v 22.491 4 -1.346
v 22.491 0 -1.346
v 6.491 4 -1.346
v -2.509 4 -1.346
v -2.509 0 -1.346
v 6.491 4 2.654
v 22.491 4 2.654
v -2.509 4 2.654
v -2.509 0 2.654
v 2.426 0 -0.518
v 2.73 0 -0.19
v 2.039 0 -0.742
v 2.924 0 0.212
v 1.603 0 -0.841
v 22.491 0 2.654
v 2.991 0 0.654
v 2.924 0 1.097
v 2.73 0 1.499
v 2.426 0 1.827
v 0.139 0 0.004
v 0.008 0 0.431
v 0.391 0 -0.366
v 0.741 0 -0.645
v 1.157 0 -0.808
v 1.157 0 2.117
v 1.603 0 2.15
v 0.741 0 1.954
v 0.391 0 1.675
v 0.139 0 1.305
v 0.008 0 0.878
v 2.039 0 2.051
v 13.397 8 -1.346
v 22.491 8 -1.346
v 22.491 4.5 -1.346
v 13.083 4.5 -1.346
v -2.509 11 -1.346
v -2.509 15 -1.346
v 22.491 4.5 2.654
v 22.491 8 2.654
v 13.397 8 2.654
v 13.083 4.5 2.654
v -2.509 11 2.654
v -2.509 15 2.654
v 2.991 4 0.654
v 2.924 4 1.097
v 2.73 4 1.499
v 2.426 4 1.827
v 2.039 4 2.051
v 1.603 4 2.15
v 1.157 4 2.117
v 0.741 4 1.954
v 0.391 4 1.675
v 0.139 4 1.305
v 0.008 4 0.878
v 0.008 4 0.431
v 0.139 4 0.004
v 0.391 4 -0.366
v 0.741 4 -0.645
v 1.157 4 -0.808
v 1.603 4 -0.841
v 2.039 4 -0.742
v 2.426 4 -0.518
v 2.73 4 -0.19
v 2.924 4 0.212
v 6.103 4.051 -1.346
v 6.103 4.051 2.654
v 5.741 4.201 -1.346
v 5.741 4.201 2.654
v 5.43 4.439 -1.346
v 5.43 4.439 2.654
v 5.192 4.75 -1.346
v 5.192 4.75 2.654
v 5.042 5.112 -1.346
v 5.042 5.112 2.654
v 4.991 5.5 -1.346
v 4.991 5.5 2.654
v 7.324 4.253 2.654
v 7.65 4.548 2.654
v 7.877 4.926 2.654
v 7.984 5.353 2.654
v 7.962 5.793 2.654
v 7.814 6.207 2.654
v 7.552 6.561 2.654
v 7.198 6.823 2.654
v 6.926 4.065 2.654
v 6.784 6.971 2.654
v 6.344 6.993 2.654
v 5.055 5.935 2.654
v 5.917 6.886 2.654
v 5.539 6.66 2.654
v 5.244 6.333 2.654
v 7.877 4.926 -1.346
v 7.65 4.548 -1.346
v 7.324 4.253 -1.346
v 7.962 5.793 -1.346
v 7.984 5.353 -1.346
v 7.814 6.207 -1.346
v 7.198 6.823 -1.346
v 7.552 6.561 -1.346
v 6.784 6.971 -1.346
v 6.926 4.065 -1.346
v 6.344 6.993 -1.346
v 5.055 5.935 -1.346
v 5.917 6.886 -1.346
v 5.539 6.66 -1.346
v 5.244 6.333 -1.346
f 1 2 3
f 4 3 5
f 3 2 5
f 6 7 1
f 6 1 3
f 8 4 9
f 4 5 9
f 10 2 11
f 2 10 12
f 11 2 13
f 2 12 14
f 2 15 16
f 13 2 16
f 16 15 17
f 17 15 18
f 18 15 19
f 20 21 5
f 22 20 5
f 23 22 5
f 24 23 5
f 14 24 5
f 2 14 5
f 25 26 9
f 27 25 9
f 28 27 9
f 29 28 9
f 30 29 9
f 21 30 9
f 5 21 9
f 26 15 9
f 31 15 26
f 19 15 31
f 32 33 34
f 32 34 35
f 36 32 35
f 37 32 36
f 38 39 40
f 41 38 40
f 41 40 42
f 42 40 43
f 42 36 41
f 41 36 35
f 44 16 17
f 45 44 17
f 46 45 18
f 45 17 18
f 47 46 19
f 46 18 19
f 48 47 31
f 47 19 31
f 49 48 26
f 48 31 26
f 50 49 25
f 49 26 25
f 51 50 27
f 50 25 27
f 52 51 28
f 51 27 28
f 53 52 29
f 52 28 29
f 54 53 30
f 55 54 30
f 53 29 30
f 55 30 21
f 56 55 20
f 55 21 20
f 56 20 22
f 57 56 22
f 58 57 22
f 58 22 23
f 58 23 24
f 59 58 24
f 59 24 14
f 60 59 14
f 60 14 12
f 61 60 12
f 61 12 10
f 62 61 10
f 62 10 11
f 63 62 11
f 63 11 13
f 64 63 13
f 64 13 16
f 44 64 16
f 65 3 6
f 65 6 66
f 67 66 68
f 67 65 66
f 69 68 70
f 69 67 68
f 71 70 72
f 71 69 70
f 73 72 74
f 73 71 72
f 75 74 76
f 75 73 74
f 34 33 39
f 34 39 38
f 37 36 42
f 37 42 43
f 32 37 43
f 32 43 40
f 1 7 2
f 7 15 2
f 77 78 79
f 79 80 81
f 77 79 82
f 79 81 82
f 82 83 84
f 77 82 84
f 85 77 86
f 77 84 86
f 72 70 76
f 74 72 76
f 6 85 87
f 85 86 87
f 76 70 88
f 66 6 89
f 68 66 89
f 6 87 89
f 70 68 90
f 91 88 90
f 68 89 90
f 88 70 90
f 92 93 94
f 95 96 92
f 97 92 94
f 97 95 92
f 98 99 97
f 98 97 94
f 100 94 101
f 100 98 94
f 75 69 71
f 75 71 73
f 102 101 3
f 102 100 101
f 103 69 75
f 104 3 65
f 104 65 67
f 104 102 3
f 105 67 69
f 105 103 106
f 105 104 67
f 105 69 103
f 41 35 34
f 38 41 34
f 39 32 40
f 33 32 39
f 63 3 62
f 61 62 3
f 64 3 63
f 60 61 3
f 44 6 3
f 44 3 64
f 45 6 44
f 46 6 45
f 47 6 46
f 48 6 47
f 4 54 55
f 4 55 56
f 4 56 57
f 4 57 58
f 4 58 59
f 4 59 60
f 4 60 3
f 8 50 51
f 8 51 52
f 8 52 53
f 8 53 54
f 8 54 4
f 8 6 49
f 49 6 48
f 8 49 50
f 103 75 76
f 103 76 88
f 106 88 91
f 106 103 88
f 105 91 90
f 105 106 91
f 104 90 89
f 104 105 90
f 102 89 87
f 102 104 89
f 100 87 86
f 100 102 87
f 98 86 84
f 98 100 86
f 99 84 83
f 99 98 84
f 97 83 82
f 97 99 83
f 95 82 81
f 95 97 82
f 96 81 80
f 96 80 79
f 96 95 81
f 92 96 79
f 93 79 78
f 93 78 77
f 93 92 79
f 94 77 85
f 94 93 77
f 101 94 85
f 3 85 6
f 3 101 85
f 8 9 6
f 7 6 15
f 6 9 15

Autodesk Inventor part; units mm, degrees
ref_plane "YZ Plane" through (0, 0, 0) normal (1, 0, 0) x (0, 1, 0)
ref_plane "XZ Plane" through (0, 0, 0) normal (0, 1, 0) x (-1, 0, 0)
ref_plane "XY Plane" through (0, 0, 0) normal (0, 0, 1) x (1, 0, 0)
sketch "Esquisse1" plane through (0, 0, 0) normal (0, 1, 0) x (-1, 0, 0)
  line L0 (2.5091, 2.6545) -> (-22.4909, 2.6545)
  line L1 (-22.4909, 2.6545) -> (-22.4909, -1.3455)
  line L2 (-22.4909, -1.3455) -> (2.5091, -1.3455)
  line L3 (2.5091, -1.3455) -> (2.5091, 2.6545)
  point P0 (0, 0)
  dimension "d0" = 4
  dimension "d1" = 25
extrude "Extrusion1" add sketch "Esquisse1" along normal blind 4
sketch "Esquisse3" plane through (22.4909, 0, -1.3455) normal (0, 0, -1) x (-1, 0, 0)
  circle A0 centre (16, 5.5) radius 1.5
  line L0 (0, 4) -> (25, 4) projected
  line L1 (25, 0) -> (25, 4) projected
  point P0 (22.4909, 0)
  dimension "d4" = 3
  dimension "d5" = 1.5
  dimension "d6" = 9
extrude "Extrusion2" add sketch "Esquisse3" against normal blind 4
sketch "Esquisse4" plane through (22.4909, 0, -1.3455) normal (0, 0, -1) x (-1, 0, 0)
  line L0 (0, 4) -> (16, 4) projected
  line L1 (25, 11) -> (9.4076, 4.5)
  line L2 (25, 0) -> (25, 4) projected
  line L3 (16, 4) -> (25, 4) projected
  line L4 (25, 11) -> (25, 15)
  line L5 (25, 15) -> (9.0943, 8)
  line L6 (9.0943, 8) -> (0, 8)
  line L7 (0, 8) -> (0, 4)
  line L8 (9.4076, 4.5) -> (0, 4.5)
  point P0 (22.4909, 0)
  point P1 (9.0943, 4)
  dimension "d9" = 0
  dimension "d10" = 7
  dimension "d11" = 4
  dimension "d12" = 4
  dimension "d15" = 0.5
extrude "Extrusion3" add sketch "Esquisse4" against normal blind 4
sketch "Esquisse6" plane through (0, 0, 0) normal (0, -1, 0) x (1, 0, 0)
  circle A0 centre (1.4909, 0.6545) radius 1.5
  line L0 (22.4909, -1.3455) -> (-2.5091, -1.3455) projected
  line L1 (-2.5091, -1.3455) -> (-2.5091, 2.6545) projected
  point P0 (0, 0)
  dimension "d16" = 3
  dimension "d17" = 2
  dimension "d18" = 4
extrude "Extrusion4" cut sketch "Esquisse6" against normal up to next
properties part number "pince a linge"
